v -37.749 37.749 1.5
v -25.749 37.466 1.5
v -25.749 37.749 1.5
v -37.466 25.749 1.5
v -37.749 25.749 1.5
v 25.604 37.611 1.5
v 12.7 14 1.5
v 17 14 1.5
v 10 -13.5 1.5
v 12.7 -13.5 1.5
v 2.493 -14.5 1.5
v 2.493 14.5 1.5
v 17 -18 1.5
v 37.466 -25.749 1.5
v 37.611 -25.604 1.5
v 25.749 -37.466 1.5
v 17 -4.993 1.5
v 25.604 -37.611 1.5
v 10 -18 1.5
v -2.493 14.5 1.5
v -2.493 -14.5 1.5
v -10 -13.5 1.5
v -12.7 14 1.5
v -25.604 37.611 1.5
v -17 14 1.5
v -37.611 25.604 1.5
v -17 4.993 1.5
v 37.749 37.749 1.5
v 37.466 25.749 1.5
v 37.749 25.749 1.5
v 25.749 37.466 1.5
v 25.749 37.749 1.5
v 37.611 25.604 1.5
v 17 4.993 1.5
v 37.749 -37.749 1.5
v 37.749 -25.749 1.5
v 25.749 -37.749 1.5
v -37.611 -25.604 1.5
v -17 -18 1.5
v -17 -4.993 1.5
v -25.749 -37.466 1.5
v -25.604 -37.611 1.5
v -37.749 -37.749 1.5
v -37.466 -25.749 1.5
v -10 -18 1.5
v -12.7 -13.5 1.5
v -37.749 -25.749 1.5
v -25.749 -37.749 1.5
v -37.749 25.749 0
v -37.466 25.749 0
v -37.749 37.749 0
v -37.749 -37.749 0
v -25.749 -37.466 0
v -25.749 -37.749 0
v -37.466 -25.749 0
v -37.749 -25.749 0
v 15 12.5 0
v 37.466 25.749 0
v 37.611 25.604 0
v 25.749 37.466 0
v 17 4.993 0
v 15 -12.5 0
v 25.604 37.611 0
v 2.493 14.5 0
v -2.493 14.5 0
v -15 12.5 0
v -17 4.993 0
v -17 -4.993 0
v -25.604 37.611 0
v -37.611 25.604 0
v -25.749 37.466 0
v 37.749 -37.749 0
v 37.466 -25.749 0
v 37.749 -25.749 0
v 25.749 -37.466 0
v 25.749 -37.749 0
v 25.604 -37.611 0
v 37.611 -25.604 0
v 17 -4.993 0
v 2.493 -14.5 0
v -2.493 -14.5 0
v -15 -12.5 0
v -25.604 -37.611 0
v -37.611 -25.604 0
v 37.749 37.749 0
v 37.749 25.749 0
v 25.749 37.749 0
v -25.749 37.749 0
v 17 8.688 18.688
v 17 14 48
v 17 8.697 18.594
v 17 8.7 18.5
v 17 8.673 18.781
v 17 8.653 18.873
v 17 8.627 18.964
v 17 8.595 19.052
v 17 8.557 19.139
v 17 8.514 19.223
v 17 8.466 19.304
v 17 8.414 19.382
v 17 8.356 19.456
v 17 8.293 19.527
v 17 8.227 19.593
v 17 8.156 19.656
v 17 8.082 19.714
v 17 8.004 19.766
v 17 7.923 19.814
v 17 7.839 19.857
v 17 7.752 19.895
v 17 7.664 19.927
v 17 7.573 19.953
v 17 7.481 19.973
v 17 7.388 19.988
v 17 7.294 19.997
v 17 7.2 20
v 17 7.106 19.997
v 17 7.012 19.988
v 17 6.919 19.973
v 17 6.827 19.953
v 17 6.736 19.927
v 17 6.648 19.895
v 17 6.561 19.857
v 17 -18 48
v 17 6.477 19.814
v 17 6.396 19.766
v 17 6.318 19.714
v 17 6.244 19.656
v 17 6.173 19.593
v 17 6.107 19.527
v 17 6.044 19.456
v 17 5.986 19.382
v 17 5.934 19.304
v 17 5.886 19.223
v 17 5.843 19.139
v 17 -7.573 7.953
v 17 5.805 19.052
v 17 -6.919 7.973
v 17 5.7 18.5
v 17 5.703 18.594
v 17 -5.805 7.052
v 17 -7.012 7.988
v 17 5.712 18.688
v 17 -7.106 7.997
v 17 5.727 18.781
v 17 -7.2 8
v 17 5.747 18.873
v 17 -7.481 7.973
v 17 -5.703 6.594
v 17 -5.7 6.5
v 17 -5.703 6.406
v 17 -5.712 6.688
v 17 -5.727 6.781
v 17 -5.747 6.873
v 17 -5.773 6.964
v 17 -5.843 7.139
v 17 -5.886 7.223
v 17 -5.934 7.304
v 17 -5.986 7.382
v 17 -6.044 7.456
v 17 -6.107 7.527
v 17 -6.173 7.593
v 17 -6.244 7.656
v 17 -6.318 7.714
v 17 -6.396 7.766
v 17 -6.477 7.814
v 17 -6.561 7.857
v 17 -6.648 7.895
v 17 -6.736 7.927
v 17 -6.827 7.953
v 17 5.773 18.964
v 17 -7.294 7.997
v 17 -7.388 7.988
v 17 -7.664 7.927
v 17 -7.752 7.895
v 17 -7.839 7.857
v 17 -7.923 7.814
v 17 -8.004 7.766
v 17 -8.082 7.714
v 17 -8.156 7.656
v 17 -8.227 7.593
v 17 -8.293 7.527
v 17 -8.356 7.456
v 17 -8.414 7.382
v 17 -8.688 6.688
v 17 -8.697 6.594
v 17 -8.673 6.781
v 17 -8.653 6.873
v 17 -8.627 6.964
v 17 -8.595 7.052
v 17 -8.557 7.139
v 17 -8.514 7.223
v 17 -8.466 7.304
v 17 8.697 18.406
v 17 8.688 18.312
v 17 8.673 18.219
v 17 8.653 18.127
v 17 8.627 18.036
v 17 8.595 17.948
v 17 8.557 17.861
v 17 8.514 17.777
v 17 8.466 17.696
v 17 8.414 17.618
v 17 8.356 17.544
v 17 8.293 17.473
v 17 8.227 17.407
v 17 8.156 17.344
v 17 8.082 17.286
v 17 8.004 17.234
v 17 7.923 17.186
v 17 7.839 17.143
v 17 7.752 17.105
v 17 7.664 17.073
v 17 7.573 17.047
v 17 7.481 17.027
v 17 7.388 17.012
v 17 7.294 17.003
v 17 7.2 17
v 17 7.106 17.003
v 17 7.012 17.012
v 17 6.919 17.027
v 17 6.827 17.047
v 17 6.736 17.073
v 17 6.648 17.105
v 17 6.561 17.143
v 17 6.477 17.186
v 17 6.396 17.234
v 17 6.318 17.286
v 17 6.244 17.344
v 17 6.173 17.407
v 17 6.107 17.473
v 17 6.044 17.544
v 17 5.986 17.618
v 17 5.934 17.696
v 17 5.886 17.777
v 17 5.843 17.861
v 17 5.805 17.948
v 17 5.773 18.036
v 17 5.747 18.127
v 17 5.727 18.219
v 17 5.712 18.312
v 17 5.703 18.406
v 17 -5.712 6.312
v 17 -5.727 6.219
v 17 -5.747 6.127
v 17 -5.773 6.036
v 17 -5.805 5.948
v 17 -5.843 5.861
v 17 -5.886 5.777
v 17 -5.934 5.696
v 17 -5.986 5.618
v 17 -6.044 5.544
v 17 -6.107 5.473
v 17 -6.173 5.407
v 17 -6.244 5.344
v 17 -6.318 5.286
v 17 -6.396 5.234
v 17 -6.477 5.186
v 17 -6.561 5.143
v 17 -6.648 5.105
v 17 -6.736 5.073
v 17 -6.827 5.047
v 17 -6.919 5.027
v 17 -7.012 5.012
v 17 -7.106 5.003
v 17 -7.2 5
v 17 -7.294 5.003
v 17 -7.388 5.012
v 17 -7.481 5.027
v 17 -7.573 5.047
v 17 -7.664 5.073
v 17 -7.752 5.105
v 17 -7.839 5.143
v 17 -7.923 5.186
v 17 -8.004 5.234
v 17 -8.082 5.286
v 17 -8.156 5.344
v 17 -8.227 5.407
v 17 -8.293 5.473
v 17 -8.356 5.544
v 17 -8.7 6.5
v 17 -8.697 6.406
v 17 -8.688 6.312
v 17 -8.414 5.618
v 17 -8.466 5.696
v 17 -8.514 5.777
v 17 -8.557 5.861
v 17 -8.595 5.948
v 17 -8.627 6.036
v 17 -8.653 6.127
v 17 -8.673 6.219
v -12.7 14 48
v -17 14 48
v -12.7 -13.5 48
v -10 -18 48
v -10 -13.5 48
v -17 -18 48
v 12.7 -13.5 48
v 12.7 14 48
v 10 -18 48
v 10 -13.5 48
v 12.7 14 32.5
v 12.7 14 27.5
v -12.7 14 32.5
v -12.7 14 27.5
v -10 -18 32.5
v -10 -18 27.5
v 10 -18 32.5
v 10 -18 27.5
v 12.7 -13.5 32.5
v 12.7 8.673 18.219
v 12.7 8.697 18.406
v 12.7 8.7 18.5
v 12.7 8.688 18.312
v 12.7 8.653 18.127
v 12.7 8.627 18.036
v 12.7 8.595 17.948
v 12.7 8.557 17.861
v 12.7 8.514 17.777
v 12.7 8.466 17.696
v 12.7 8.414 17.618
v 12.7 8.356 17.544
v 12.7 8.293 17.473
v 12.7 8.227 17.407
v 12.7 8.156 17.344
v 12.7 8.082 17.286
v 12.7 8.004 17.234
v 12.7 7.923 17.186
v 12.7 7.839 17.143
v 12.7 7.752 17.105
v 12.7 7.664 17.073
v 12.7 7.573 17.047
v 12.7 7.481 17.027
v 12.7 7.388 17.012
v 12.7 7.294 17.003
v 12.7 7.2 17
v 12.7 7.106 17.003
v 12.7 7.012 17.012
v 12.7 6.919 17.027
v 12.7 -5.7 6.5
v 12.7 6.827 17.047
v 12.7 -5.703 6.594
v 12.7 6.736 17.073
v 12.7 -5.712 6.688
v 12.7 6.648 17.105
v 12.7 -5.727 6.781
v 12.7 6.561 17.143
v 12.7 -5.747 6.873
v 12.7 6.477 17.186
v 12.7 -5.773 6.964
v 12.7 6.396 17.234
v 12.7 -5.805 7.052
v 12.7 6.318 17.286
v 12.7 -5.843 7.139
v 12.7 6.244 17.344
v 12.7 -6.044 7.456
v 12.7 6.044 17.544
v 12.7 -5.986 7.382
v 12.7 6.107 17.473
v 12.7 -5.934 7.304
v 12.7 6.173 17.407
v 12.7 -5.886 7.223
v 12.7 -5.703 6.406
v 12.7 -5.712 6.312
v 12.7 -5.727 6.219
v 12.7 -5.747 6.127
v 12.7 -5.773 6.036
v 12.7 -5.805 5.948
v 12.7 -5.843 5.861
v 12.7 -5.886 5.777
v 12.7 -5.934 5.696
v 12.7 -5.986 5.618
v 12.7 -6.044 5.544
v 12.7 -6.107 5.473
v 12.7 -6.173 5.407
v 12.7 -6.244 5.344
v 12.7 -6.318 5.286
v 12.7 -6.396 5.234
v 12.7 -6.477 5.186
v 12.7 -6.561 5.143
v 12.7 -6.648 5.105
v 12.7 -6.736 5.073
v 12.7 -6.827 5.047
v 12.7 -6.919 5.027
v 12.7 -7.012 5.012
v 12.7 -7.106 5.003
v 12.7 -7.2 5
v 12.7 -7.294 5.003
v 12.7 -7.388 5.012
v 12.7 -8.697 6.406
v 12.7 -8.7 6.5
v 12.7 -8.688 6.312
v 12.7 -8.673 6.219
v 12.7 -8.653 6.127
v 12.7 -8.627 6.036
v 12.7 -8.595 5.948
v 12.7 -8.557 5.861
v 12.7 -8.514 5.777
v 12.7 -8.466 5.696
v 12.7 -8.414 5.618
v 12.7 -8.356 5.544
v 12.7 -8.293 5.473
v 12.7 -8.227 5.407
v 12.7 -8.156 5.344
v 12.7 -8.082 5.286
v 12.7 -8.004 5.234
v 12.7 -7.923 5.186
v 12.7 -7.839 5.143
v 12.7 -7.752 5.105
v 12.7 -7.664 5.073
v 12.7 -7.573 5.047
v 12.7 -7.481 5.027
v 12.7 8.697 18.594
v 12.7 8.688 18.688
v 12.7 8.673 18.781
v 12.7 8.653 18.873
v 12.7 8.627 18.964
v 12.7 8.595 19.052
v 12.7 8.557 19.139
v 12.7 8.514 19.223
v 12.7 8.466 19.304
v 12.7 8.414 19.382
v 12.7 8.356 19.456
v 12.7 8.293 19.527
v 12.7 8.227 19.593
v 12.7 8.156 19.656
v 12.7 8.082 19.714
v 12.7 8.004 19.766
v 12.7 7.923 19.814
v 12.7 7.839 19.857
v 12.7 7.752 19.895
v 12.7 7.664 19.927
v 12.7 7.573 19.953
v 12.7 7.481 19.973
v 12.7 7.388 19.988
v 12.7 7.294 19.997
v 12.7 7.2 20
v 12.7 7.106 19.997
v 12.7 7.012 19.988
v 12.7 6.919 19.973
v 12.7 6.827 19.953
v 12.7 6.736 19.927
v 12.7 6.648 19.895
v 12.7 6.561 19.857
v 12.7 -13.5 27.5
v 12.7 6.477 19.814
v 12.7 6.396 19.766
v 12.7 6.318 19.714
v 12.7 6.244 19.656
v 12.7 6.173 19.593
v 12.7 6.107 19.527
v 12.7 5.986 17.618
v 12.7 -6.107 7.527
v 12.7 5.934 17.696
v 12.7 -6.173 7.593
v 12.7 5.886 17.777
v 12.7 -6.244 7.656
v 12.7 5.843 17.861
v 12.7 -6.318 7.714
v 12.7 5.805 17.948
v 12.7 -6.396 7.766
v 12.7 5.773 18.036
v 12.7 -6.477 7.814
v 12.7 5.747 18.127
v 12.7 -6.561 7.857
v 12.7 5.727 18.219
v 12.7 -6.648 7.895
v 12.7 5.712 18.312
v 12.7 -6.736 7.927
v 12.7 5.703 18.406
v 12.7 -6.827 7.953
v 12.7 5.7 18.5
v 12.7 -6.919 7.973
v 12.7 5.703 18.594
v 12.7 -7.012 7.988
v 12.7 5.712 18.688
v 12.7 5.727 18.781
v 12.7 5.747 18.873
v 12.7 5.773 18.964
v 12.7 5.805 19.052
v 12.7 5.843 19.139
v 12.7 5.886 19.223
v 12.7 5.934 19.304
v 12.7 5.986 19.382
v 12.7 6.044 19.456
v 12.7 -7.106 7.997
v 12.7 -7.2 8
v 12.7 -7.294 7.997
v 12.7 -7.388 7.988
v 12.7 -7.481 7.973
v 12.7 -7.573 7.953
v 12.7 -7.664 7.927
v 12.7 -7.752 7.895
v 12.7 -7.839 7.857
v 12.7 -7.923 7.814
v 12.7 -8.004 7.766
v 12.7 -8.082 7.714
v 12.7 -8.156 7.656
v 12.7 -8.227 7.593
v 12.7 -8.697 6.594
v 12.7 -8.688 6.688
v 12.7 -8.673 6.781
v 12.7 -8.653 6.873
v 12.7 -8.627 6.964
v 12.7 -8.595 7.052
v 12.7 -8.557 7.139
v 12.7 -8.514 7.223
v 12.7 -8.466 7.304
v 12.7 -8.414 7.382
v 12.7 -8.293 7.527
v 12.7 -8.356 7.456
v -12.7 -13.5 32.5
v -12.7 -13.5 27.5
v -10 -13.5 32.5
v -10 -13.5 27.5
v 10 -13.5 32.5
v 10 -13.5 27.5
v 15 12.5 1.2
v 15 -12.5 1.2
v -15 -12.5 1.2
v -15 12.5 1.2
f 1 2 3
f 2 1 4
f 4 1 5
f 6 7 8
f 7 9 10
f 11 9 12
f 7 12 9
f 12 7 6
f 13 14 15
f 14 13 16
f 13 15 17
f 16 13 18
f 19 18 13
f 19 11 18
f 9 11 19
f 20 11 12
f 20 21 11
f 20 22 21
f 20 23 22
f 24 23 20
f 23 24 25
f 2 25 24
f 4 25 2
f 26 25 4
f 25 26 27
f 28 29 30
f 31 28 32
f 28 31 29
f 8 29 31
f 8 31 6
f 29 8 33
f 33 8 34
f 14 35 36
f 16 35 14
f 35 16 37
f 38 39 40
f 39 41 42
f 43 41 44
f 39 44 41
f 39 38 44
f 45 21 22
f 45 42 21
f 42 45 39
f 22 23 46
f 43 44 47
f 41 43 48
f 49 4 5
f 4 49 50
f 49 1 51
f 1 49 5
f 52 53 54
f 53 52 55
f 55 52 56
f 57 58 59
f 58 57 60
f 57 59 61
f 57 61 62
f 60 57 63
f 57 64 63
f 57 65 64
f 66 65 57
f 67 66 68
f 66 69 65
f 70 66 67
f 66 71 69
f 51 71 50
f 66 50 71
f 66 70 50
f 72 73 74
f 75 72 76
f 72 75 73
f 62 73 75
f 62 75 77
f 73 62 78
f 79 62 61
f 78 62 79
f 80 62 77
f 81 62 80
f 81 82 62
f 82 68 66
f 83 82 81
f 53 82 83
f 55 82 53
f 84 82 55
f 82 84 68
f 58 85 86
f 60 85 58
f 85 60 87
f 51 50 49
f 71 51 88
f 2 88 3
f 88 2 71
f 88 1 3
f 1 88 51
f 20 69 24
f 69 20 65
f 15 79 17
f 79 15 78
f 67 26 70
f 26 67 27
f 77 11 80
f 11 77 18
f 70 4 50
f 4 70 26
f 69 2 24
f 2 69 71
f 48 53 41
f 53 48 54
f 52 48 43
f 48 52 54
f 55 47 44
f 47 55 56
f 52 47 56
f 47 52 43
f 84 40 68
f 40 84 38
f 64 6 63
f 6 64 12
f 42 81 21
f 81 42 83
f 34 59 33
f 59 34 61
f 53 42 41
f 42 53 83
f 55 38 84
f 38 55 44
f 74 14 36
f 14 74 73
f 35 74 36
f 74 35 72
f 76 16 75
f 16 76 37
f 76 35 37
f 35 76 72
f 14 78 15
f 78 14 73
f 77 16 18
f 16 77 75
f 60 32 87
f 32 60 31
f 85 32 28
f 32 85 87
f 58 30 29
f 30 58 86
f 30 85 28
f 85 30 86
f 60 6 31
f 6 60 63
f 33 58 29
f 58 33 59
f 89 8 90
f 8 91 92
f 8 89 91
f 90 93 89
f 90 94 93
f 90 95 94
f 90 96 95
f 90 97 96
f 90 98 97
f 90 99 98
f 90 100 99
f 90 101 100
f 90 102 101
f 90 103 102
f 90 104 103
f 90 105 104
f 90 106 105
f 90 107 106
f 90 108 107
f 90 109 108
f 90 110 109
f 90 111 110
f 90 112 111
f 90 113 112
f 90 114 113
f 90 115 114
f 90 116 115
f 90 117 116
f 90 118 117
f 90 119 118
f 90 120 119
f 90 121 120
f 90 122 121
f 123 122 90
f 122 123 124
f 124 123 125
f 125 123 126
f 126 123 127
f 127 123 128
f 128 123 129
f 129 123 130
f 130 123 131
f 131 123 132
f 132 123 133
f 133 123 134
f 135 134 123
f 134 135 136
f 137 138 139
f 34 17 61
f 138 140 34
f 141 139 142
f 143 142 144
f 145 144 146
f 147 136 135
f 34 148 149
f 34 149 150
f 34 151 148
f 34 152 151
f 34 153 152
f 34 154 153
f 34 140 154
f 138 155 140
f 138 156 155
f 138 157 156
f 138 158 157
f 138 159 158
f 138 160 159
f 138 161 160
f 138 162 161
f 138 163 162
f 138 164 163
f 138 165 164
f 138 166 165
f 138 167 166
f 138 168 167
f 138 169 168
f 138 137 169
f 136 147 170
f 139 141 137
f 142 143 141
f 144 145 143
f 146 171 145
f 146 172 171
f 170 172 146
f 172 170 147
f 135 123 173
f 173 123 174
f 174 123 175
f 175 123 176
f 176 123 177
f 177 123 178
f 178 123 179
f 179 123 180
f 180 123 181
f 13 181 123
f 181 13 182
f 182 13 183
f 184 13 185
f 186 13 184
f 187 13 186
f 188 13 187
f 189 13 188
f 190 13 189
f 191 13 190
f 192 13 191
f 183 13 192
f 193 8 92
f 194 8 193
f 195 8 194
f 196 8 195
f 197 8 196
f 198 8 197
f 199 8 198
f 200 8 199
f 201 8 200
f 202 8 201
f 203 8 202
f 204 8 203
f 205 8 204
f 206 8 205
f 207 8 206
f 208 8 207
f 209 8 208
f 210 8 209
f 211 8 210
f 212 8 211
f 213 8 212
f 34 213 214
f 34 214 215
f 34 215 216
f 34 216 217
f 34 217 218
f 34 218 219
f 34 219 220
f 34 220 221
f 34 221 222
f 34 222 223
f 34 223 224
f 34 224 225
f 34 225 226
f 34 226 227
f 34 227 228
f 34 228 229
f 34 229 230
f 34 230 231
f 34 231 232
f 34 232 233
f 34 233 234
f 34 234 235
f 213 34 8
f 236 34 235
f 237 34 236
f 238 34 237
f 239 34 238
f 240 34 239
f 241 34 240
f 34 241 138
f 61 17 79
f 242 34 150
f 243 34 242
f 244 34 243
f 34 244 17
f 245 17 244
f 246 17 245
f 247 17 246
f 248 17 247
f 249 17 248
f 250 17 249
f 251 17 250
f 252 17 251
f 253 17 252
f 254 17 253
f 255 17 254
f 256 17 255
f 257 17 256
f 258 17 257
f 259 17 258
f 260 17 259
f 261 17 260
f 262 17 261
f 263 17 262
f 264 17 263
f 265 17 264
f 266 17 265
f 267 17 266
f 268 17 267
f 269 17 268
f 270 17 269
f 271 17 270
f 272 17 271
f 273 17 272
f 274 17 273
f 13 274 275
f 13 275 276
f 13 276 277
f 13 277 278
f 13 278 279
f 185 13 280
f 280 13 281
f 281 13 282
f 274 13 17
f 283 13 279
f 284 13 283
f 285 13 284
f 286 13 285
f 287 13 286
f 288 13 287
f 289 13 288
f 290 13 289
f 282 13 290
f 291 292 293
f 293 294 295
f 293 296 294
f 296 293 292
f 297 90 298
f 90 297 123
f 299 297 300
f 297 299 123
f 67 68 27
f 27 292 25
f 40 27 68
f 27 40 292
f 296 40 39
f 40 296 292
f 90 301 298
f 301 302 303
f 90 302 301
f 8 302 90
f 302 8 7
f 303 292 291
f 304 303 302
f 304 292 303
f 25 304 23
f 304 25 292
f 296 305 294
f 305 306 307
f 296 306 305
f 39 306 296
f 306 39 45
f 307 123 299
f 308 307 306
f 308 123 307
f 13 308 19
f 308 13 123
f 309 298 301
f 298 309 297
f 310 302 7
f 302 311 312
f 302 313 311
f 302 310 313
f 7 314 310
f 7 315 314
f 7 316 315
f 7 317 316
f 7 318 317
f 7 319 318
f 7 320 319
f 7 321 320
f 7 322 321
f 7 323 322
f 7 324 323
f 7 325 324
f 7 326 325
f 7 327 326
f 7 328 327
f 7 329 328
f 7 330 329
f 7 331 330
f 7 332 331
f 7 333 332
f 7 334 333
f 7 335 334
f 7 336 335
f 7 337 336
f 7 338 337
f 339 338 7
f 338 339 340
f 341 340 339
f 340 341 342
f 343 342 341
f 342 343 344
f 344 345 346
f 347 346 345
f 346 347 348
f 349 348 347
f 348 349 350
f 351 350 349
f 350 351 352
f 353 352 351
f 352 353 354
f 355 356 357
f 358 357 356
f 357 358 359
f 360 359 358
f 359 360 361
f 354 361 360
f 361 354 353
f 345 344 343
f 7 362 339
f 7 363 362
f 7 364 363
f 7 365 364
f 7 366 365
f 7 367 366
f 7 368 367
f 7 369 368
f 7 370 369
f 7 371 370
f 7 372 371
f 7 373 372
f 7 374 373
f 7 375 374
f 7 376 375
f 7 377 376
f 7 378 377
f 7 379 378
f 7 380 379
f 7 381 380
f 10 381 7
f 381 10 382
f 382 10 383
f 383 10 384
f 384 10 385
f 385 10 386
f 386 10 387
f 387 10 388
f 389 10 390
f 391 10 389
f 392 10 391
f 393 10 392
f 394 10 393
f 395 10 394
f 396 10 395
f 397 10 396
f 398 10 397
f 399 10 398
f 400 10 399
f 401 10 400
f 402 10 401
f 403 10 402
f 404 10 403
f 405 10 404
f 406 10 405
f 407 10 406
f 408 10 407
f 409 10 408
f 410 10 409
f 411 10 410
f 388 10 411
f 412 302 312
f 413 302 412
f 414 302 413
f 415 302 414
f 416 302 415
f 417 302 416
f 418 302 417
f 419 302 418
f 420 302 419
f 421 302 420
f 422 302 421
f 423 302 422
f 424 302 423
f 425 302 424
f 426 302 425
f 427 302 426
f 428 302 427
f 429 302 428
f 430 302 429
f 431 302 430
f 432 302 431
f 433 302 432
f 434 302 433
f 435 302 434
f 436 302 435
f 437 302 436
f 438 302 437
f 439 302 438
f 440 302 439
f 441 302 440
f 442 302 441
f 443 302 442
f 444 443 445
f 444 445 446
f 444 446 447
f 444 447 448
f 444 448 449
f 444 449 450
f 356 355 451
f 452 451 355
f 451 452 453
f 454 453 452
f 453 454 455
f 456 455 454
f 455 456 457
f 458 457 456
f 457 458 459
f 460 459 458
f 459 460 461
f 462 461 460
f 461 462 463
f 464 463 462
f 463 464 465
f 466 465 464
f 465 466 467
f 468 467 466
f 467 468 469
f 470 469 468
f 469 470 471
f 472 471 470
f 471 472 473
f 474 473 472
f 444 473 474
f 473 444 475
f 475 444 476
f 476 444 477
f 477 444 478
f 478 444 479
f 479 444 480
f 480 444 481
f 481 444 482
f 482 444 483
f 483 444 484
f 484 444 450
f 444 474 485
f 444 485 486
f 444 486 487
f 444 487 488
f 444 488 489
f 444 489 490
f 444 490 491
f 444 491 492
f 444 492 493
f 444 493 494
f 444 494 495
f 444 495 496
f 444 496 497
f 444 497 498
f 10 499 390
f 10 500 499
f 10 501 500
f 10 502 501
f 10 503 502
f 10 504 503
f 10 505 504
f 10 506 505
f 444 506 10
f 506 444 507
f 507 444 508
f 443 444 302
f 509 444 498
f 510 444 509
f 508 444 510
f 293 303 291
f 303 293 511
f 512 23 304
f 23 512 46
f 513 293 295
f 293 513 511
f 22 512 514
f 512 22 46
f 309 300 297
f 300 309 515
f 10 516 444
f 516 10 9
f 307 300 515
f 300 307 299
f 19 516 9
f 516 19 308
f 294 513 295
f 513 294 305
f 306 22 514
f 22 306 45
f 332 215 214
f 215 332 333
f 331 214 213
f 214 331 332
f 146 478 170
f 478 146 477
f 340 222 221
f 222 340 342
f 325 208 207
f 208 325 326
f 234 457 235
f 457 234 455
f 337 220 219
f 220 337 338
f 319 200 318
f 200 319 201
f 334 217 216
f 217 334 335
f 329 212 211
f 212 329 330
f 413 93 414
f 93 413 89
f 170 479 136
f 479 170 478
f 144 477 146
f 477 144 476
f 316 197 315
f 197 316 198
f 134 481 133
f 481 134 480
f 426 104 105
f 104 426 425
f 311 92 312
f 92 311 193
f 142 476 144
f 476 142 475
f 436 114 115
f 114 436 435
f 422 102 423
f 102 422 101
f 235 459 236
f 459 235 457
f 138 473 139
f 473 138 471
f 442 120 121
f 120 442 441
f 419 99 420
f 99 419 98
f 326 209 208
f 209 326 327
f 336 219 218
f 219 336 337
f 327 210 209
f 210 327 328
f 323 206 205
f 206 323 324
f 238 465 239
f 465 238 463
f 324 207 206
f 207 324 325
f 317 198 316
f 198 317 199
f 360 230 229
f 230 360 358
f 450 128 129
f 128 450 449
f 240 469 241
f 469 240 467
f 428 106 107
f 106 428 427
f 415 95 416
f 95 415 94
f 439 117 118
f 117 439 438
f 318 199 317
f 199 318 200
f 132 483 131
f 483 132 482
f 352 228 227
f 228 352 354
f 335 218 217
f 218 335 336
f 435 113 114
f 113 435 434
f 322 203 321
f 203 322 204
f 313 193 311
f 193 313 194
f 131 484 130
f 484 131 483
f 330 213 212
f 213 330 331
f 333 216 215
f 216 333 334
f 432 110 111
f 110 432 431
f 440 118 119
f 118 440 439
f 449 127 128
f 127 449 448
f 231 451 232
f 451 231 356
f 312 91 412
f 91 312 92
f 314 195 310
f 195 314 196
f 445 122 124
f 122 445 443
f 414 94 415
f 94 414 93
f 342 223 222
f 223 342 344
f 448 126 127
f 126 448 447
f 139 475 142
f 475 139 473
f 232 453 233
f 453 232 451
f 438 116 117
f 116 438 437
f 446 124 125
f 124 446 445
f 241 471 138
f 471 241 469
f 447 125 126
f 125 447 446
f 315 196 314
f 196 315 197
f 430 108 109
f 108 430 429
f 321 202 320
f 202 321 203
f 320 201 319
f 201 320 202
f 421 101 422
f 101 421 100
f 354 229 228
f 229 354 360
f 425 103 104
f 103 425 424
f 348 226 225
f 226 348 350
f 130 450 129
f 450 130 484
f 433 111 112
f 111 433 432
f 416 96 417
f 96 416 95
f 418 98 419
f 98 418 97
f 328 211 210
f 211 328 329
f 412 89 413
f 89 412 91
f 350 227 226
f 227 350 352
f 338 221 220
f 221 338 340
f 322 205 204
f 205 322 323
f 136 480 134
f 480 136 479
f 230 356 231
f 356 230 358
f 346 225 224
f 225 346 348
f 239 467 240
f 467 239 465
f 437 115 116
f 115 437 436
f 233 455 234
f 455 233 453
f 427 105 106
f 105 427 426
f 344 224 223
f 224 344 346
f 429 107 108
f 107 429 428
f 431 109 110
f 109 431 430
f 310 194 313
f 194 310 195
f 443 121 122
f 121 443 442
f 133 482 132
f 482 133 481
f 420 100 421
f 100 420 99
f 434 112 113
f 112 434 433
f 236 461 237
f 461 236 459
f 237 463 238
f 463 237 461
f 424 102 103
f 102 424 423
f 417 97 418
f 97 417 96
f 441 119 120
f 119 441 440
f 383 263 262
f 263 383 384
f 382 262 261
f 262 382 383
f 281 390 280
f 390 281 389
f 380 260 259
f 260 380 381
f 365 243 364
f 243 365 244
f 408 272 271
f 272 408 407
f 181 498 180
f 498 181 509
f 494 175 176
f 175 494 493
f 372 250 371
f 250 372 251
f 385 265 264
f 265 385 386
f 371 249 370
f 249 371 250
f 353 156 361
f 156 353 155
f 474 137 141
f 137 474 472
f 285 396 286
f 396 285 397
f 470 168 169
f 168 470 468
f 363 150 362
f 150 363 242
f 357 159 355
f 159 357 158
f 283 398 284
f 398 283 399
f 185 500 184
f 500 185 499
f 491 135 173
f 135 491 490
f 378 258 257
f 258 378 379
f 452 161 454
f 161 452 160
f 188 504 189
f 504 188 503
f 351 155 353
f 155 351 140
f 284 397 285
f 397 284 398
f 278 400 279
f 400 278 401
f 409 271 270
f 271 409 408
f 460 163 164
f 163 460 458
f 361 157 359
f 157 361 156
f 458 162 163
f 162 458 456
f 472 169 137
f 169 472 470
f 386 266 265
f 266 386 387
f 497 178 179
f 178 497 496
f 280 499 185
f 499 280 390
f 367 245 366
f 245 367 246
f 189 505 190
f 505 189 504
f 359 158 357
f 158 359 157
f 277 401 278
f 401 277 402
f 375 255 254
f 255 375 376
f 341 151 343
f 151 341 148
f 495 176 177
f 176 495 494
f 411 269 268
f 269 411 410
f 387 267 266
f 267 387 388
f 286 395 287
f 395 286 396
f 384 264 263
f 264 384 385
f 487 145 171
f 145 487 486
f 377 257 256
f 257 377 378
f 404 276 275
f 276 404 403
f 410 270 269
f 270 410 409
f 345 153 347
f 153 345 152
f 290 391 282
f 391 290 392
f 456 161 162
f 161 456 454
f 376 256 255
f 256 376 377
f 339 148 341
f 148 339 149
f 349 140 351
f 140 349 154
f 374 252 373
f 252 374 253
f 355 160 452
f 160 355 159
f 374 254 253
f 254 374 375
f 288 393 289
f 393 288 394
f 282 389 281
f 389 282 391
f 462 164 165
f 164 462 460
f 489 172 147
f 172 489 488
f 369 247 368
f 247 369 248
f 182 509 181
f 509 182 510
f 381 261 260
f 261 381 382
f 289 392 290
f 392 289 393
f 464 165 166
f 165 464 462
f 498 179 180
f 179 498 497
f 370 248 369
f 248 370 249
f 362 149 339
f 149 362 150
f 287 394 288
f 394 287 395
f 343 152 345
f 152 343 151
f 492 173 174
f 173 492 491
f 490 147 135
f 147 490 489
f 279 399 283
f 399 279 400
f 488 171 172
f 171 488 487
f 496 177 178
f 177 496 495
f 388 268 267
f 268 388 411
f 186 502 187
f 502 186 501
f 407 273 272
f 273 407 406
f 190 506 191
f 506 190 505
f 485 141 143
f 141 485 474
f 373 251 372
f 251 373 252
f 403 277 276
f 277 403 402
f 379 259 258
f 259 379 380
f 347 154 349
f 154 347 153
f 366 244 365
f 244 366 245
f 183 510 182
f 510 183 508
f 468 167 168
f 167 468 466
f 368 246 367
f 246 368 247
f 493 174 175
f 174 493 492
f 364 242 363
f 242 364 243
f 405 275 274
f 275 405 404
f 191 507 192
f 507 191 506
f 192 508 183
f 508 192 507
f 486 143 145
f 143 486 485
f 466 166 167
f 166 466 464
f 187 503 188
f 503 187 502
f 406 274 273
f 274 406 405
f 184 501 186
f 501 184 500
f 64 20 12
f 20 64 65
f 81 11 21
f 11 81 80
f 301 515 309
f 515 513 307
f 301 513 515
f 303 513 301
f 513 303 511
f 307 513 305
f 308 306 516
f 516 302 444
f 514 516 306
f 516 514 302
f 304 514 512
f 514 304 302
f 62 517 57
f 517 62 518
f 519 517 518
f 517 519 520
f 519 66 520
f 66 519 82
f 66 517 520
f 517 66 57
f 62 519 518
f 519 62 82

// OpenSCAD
// file: utility.scad
module tx(x) { translate([ x, 0, 0 ]) children(); }
module ty(y) { translate([ 0, y, 0 ]) children(); }
module tz(z) { translate([ 0, 0, z ]) children(); }
module txy(x, y) { translate([ x, y, 0 ]) children(); }
module txz(x, z) { translate([ x, 0, z ]) children(); }
module tyz(y, z) { translate([ 0, y, z ]) children(); }
module txyz(x, y, z) { translate([ x, y, z ]) children(); }
module rx(x) { rotate([ x, 0, 0 ]) children(); }
module ry(y) { rotate([ 0, y, 0 ]) children(); }
module rz(z) { rotate([ 0, 0, z ]) children(); }
module rxy(x, y) { rotate([ x, y, 0 ]) children(); }
module rxz(x, z) { rotate([ x, 0, z ]) children(); }
module ryz(y, z) { rotate([ 0, y, z ]) children(); }
module rxyz(x, y, z) { rotate([ x, y, z ]) children(); }
module mx() {
	mirror([ 1, 0, 0 ]) children();
	children();
}
module my() {
	mirror([ 0, 1, 0 ]) children();
	children();
}
module mz() {
	mirror([ 0, 0, 1 ]) children();
	children();
}
module mxy() {
	mirror([ 1, 1, 0 ]) children();
	children();
}
module torus(r1, r2) { rotate_extrude(angle = 360) tx(r1) circle(r = r2); }

module tri(side = 10, center = false) {
	if (center) {
		polygon(points =
		            [for (i = [0:2])[side / 2 / sin(60) * sin(120 * i + 0),
		                             side / 2 / sin(60) * cos(120 * i + 0)]]);
	} else {
		polygon(points = [
			[ 0, 0 ], [ side * cos(30), side / 2 ],
			[ side * cos(30), -side / 2 ]
		]);
	}
}

module rsquare(size = [ 10, 10 ], r = 2) {
	union() {
		square([ size.x, size.y - 2 * r ], center = true);
		square([ size.x - 2 * r, size.y ], center = true);
		translate([ size.x / 2 - r, size.y / 2 - r ]) circle(r = r);
		translate([ size.x / 2 - r, -size.y / 2 + r ]) circle(r = r);
		translate([ -size.x / 2 + r, size.y / 2 - r ]) circle(r = r);
		translate([ -size.x / 2 + r, -size.y / 2 + r ]) circle(r = r);
	}
}

module counterSink(screwDiameter = 3, tol = 0.4, height = 3) {
	union() {
		cylinder(r1 = (screwDiameter + tol) / 2,
		         r2 = (screwDiameter + tol) / 2 + height, h = height);
		cylinder(r = (screwDiameter + tol) / 2, h = height * 2, center = true);
	}
}

module skew(sk = [ 0, 0 ]) {
	multmatrix([
		[ 1, 0, sk.x, 0 ],
		[ 0, 1, sk.y, 0 ],
		[ 0, 0, 1, 0 ],
		[ 0, 0, 0, 1 ],
	]) children();
}
// main file
use <utility.scad>
use <components.scad>

$fn = 100;
m2mm = 0.0254;
rs = 1.1;
tol = 0.4;

module kick_strut(){
    difference(){
    union(){
        for(i=[0:3]) rz(45+90*i) tyz(39.9, 0.75){
            ty(5) rz(45)cube([12,12,1.5],center = true);
            ty(-20.2) cube([(12)*1.415,(50),1.5],center = true);
        }
        tz(0.75) cube([30,29,1.5],center = true);
        
        tyz(-2,30) cube([34,32,5],center = true);
        
        tz(12) difference(){
            tyz(-2,12) cube([34,32,48],center = true);
            tyz(1.5,2) cube([25+tol,30,70],center = true);
            ty(-4) cube([20,30,74],center = true);
            txyz(13,7.2,6.5) ry(90) cylinder(d = 3, h = 10,center = true); 
            txyz(13,-7.2,-5.5) ry(90) cylinder(d = 3, h = 10,center = true);
        }
    }
    tz(0.2) cube([30,25,2],center=true);
    }
}
//tyz(-30,40) ry(90) rxz(90,90)newBattery();
//tz(12.5) ry(90) solenoid();
kick_strut();
